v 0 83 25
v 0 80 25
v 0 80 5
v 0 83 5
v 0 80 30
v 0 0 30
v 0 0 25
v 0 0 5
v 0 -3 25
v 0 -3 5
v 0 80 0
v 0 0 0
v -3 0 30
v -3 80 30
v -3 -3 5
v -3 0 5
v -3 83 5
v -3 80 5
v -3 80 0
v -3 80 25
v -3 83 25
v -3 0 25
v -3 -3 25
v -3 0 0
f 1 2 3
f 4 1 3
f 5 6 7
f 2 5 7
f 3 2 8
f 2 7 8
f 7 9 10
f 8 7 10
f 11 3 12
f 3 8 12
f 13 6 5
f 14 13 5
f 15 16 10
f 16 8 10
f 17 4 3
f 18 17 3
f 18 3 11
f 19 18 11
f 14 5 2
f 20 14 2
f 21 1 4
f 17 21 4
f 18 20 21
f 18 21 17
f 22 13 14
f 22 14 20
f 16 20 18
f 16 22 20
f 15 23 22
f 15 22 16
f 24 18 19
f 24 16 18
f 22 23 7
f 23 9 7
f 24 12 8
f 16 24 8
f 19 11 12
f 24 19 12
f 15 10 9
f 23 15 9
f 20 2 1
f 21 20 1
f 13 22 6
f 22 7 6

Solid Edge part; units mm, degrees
sketch "Sketch1" plane through (0, 0, 0) normal (1, 0, 0) x (0, 1, 0)
  line L0 (0, 30) -> (80, 30)
  line L1 (80, 30) -> (80, 25)
  line L2 (80, 25) -> (83, 25)
  line L3 (83, 25) -> (83, 5)
  line L4 (83, 5) -> (80, 5)
  line L5 (80, 5) -> (80, 0)
  line L6 (80, 0) -> (0, 0)
  line L7 (0, 0) -> (0, 5)
  line L8 (0, 5) -> (-3, 5)
  line L9 (-3, 5) -> (-3, 25)
  line L10 (-3, 25) -> (0, 25)
  line L11 (0, 25) -> (0, 30)
  dimension "D1" = 80
  dimension "D2" = 3
  dimension "D3" = 20
  dimension "D4" = 5
extrude "Protrusion1" add sketch "Sketch1" against normal blind 3
properties material "Acier"
